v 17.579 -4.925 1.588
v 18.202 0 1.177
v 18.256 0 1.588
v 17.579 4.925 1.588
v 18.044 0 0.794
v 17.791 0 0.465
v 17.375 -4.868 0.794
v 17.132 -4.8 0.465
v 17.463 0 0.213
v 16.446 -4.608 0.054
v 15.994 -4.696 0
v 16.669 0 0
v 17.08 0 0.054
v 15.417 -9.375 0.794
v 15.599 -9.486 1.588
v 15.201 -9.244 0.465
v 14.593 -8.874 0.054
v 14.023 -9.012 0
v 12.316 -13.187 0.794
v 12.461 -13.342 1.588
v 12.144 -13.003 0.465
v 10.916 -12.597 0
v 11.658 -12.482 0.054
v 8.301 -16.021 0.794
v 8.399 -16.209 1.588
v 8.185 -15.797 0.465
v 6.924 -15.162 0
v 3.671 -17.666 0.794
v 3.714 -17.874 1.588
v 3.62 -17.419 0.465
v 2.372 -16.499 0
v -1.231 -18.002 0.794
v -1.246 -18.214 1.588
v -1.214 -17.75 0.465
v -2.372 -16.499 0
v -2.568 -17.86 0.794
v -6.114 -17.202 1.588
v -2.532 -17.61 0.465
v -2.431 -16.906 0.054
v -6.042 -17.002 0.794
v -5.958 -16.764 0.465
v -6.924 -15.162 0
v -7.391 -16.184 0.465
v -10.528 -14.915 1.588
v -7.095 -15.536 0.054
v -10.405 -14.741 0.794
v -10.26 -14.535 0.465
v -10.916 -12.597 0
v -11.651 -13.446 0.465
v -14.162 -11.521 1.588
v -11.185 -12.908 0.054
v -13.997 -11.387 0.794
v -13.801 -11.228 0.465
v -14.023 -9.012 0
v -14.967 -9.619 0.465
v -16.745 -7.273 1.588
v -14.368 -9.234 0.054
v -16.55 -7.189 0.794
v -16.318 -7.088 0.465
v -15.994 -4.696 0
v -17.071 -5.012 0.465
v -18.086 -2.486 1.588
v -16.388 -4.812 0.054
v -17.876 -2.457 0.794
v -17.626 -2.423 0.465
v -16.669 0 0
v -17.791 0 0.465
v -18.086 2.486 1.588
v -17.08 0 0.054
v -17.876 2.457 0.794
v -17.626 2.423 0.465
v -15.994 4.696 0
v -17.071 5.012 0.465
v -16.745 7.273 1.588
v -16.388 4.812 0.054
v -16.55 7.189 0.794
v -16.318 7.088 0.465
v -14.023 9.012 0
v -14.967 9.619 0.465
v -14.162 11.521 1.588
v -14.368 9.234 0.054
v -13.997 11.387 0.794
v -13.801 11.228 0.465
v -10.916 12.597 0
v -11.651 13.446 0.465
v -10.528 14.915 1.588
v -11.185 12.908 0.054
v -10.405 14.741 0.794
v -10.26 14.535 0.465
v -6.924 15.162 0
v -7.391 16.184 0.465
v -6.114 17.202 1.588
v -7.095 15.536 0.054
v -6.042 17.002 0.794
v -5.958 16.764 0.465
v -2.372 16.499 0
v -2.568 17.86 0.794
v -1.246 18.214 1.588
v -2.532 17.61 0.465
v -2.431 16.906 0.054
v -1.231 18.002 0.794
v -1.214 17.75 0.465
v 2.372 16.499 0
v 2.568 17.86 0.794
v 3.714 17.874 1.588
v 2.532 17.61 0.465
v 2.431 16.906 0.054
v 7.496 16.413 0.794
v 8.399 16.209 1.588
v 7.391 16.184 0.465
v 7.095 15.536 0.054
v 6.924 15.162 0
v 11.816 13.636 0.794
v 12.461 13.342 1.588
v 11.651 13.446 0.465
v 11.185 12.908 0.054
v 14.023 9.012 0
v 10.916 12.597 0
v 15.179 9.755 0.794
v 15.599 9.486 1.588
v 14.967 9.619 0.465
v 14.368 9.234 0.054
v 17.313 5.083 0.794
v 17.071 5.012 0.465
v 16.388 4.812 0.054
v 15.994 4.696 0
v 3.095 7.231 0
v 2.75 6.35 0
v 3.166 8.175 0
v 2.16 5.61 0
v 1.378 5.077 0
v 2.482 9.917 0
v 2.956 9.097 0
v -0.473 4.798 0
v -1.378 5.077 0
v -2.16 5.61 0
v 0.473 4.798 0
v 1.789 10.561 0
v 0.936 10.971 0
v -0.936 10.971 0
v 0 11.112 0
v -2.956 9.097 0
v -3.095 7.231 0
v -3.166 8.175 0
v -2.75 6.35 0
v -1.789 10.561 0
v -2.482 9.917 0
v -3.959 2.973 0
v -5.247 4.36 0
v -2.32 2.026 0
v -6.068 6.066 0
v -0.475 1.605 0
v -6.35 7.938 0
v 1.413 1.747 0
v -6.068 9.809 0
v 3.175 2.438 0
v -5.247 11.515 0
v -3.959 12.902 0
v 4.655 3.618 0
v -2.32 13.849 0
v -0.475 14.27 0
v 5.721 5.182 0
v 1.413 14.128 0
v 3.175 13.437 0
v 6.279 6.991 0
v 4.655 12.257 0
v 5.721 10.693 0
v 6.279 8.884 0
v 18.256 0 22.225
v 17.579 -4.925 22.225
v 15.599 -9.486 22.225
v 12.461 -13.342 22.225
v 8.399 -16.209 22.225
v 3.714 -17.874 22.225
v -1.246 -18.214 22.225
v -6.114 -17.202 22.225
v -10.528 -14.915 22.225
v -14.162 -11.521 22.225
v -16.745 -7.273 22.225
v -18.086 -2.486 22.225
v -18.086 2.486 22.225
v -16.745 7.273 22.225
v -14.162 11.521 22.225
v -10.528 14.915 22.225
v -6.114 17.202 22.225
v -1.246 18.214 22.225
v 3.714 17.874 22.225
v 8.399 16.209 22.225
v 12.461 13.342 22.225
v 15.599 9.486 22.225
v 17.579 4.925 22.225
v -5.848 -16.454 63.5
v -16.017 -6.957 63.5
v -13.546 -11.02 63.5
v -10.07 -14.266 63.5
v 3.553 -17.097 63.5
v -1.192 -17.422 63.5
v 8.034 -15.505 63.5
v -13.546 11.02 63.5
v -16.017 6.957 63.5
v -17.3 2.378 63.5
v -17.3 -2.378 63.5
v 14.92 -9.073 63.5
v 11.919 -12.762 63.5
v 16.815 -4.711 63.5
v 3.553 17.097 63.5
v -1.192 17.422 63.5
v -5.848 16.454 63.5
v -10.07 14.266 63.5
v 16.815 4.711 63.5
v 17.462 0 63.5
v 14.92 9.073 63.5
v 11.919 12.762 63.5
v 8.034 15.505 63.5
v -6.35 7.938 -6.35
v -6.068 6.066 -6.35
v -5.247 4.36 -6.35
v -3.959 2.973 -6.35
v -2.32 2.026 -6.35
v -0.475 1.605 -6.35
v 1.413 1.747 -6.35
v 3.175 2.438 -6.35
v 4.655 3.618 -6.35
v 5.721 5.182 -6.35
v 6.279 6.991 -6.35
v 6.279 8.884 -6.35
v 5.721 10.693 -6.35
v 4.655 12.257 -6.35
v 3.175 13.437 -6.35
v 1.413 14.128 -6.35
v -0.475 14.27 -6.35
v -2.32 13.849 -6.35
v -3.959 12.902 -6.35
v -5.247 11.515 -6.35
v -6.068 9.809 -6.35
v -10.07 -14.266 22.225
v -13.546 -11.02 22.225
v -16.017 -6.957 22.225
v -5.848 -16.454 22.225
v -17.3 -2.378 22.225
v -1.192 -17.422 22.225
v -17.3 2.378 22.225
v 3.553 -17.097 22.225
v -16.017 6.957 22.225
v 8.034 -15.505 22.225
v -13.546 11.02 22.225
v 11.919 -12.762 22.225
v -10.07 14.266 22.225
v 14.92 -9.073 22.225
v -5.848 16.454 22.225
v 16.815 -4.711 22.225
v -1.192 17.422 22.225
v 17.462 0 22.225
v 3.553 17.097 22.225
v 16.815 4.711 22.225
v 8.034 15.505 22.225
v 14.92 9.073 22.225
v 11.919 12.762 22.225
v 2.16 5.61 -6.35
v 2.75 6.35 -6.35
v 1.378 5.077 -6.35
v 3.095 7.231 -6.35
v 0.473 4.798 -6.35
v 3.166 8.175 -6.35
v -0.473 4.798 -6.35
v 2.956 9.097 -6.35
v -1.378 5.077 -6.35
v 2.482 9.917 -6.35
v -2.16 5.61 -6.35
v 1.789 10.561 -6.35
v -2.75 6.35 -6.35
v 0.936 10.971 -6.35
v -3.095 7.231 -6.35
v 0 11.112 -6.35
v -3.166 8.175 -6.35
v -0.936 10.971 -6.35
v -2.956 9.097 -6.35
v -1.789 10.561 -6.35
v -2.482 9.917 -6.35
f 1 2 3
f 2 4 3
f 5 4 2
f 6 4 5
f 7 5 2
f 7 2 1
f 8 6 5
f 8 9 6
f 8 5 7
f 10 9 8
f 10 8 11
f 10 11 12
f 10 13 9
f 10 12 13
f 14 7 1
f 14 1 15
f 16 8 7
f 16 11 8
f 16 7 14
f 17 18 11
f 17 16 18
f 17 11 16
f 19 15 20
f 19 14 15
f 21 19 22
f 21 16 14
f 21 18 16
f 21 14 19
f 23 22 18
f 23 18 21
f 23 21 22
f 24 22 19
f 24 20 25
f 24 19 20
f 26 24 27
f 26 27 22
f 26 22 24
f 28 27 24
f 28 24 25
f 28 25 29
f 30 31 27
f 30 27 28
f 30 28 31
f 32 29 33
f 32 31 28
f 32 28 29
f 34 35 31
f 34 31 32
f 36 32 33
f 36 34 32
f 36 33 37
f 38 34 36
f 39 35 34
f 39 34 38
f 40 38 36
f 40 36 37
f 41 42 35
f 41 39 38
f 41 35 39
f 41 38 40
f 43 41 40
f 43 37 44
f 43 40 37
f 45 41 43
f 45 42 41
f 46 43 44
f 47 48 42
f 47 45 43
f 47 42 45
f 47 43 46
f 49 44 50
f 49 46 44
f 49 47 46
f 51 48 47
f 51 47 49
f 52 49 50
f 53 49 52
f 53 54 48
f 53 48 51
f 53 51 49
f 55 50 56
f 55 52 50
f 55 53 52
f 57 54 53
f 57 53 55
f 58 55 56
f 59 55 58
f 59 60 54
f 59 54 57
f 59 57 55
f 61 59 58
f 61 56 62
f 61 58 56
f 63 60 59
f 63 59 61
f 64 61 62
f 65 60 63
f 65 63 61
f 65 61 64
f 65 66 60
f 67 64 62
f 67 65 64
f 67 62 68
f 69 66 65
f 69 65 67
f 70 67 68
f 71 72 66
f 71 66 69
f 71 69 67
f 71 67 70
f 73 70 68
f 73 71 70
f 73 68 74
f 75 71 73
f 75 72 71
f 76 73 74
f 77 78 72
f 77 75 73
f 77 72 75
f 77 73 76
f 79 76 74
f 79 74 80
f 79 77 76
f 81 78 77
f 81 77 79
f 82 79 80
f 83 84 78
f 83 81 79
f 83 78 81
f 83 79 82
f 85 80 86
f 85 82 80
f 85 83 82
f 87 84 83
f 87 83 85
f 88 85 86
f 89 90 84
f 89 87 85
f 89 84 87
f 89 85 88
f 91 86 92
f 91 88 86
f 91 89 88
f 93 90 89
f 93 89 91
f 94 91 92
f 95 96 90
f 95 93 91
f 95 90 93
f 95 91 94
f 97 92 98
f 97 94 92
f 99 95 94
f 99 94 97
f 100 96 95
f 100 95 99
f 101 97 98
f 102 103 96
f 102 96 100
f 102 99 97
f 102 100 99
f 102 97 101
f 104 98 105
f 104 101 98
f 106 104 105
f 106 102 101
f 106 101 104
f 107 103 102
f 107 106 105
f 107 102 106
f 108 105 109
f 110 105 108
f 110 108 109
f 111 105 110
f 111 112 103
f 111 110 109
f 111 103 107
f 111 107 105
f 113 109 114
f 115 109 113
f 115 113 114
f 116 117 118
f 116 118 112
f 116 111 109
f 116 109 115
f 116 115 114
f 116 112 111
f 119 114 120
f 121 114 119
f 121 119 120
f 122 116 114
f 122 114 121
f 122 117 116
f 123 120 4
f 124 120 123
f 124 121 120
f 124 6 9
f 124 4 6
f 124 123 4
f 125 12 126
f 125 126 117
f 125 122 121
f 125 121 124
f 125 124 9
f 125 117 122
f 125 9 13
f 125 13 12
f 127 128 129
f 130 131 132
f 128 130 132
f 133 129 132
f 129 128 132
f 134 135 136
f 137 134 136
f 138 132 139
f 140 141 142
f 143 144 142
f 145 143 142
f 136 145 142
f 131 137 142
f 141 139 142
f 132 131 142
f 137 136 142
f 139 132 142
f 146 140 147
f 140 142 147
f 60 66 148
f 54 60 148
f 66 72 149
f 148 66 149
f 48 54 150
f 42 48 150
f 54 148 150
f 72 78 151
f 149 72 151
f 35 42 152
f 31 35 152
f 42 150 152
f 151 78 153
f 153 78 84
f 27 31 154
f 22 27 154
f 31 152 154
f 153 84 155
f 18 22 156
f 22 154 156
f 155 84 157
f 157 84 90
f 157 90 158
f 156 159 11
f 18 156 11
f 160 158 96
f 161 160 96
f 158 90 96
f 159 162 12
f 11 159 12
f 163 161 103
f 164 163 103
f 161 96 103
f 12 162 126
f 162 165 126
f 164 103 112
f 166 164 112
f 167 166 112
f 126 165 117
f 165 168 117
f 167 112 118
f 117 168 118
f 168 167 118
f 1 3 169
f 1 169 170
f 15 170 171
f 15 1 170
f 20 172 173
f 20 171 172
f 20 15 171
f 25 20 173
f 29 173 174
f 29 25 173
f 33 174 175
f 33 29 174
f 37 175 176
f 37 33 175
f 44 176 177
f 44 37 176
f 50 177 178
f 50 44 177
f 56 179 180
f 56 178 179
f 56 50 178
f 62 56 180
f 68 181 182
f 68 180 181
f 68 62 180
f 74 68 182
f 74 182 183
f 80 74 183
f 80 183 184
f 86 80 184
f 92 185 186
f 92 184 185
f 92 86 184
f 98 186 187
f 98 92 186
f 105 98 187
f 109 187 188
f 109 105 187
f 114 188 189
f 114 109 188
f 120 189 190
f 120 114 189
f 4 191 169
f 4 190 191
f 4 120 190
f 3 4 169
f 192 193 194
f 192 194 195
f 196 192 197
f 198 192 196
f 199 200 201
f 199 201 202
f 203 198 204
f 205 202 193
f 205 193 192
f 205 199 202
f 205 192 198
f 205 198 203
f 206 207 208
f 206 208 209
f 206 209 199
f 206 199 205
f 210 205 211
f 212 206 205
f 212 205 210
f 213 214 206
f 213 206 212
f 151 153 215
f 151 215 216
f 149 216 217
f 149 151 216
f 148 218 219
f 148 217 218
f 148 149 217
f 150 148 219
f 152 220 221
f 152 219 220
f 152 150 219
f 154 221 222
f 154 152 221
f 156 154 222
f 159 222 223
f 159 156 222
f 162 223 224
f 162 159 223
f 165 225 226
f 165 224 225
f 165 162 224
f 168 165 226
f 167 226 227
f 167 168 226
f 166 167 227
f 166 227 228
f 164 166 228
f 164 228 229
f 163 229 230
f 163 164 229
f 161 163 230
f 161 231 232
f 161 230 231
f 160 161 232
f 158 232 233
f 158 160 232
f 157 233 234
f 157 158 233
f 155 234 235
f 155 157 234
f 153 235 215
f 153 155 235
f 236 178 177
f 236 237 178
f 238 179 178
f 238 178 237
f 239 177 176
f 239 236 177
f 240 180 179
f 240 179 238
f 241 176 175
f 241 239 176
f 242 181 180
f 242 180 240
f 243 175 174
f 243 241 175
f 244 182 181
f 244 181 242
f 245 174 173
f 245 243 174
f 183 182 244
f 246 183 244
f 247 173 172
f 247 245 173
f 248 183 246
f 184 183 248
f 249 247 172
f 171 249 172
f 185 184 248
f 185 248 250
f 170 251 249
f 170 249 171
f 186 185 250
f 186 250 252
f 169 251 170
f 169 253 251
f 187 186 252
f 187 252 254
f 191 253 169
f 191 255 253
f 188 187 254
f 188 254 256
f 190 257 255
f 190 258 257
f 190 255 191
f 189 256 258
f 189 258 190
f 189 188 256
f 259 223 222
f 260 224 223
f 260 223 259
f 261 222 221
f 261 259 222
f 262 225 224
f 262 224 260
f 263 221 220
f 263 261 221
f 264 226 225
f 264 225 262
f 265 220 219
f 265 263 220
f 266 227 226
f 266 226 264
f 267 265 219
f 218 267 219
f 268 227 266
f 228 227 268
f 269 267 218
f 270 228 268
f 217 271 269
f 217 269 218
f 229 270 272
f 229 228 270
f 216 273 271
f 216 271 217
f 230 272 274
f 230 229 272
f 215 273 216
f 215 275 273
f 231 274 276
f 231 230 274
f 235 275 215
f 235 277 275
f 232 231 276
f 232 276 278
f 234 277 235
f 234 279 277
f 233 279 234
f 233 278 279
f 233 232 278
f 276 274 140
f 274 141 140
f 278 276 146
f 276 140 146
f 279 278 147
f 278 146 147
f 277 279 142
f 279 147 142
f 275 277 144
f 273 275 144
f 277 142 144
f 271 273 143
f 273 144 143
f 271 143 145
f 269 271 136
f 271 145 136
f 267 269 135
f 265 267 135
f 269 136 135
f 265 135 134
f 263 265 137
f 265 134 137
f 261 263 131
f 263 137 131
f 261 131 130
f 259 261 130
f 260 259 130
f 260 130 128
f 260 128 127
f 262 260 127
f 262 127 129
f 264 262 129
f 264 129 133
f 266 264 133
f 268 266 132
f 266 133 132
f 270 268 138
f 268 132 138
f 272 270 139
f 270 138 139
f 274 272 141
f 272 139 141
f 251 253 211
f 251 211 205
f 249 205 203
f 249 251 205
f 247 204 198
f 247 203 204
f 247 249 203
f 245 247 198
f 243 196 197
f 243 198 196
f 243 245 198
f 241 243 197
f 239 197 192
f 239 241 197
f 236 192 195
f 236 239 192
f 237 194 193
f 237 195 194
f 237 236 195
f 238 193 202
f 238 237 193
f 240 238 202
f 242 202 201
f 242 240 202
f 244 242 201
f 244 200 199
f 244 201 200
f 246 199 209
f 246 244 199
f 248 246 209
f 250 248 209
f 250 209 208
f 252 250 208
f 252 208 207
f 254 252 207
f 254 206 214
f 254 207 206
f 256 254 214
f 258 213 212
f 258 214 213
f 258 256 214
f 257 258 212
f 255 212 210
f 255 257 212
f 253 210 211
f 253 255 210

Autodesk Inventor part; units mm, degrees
ref_plane "YZ Plane" through (0, 0, 0) normal (1, 0, 0) x (0, 1, 0)
ref_plane "XZ Plane" through (0, 0, 0) normal (0, 1, 0) x (-1, 0, 0)
ref_plane "XY Plane" through (0, 0, 0) normal (0, 0, 1) x (1, 0, 0)
sketch "Sketch1" plane through (0, 0, 0) normal (0, 0, 1) x (1, 0, 0)
  circle A0 centre (0, 0) radius 18.2563
  dimension "d0" = 36.5125
extrude "Extrusion1" add sketch "Sketch1" along normal blind 22.225
sketch "Sketch2" plane through (0, 0, 22.225) normal (0, 0, 1) x (1, 0, 0)
  circle A0 centre (0, 0) radius 18.2562 projected
  circle A1 centre (0, 0) radius 17.4625
  dimension "d3" = 34.925
extrude "Extrusion2" add sketch "Sketch2" along normal blind 41.275 contours A1
fillet "Fillet1" radius 1.5875 1 edges at (-18.2563, 0, 0)
sketch "Sketch3" plane through (0, 0, 0) normal (0, 0, -1) x (-1, 0, 0)
  circle A0 centre (0, 0) radius 16.6687 projected
  circle A1 centre (0, 7.9375) radius 6.35
  dimension "d7" = 12.7
  dimension "d8" = 7.9375
extrude "Extrusion3" add sketch "Sketch3" along normal blind 6.35 contours A1
sketch "Sketch4" plane through (0, 7.9375, -6.35) normal (0, 0, -1) x (-1, 0, 0)
  circle A0 centre (0, 0) radius 6.35 projected
  circle A1 centre (0, 0) radius 3.175
  point P0 (0, -7.9375)
  dimension "d11" = 6.35
hole "Hole1" at (0, 7.9375, -6.35) direction (0, 0, 1) diameter 6.35 depth 6.35
properties part number "Motorbase"
